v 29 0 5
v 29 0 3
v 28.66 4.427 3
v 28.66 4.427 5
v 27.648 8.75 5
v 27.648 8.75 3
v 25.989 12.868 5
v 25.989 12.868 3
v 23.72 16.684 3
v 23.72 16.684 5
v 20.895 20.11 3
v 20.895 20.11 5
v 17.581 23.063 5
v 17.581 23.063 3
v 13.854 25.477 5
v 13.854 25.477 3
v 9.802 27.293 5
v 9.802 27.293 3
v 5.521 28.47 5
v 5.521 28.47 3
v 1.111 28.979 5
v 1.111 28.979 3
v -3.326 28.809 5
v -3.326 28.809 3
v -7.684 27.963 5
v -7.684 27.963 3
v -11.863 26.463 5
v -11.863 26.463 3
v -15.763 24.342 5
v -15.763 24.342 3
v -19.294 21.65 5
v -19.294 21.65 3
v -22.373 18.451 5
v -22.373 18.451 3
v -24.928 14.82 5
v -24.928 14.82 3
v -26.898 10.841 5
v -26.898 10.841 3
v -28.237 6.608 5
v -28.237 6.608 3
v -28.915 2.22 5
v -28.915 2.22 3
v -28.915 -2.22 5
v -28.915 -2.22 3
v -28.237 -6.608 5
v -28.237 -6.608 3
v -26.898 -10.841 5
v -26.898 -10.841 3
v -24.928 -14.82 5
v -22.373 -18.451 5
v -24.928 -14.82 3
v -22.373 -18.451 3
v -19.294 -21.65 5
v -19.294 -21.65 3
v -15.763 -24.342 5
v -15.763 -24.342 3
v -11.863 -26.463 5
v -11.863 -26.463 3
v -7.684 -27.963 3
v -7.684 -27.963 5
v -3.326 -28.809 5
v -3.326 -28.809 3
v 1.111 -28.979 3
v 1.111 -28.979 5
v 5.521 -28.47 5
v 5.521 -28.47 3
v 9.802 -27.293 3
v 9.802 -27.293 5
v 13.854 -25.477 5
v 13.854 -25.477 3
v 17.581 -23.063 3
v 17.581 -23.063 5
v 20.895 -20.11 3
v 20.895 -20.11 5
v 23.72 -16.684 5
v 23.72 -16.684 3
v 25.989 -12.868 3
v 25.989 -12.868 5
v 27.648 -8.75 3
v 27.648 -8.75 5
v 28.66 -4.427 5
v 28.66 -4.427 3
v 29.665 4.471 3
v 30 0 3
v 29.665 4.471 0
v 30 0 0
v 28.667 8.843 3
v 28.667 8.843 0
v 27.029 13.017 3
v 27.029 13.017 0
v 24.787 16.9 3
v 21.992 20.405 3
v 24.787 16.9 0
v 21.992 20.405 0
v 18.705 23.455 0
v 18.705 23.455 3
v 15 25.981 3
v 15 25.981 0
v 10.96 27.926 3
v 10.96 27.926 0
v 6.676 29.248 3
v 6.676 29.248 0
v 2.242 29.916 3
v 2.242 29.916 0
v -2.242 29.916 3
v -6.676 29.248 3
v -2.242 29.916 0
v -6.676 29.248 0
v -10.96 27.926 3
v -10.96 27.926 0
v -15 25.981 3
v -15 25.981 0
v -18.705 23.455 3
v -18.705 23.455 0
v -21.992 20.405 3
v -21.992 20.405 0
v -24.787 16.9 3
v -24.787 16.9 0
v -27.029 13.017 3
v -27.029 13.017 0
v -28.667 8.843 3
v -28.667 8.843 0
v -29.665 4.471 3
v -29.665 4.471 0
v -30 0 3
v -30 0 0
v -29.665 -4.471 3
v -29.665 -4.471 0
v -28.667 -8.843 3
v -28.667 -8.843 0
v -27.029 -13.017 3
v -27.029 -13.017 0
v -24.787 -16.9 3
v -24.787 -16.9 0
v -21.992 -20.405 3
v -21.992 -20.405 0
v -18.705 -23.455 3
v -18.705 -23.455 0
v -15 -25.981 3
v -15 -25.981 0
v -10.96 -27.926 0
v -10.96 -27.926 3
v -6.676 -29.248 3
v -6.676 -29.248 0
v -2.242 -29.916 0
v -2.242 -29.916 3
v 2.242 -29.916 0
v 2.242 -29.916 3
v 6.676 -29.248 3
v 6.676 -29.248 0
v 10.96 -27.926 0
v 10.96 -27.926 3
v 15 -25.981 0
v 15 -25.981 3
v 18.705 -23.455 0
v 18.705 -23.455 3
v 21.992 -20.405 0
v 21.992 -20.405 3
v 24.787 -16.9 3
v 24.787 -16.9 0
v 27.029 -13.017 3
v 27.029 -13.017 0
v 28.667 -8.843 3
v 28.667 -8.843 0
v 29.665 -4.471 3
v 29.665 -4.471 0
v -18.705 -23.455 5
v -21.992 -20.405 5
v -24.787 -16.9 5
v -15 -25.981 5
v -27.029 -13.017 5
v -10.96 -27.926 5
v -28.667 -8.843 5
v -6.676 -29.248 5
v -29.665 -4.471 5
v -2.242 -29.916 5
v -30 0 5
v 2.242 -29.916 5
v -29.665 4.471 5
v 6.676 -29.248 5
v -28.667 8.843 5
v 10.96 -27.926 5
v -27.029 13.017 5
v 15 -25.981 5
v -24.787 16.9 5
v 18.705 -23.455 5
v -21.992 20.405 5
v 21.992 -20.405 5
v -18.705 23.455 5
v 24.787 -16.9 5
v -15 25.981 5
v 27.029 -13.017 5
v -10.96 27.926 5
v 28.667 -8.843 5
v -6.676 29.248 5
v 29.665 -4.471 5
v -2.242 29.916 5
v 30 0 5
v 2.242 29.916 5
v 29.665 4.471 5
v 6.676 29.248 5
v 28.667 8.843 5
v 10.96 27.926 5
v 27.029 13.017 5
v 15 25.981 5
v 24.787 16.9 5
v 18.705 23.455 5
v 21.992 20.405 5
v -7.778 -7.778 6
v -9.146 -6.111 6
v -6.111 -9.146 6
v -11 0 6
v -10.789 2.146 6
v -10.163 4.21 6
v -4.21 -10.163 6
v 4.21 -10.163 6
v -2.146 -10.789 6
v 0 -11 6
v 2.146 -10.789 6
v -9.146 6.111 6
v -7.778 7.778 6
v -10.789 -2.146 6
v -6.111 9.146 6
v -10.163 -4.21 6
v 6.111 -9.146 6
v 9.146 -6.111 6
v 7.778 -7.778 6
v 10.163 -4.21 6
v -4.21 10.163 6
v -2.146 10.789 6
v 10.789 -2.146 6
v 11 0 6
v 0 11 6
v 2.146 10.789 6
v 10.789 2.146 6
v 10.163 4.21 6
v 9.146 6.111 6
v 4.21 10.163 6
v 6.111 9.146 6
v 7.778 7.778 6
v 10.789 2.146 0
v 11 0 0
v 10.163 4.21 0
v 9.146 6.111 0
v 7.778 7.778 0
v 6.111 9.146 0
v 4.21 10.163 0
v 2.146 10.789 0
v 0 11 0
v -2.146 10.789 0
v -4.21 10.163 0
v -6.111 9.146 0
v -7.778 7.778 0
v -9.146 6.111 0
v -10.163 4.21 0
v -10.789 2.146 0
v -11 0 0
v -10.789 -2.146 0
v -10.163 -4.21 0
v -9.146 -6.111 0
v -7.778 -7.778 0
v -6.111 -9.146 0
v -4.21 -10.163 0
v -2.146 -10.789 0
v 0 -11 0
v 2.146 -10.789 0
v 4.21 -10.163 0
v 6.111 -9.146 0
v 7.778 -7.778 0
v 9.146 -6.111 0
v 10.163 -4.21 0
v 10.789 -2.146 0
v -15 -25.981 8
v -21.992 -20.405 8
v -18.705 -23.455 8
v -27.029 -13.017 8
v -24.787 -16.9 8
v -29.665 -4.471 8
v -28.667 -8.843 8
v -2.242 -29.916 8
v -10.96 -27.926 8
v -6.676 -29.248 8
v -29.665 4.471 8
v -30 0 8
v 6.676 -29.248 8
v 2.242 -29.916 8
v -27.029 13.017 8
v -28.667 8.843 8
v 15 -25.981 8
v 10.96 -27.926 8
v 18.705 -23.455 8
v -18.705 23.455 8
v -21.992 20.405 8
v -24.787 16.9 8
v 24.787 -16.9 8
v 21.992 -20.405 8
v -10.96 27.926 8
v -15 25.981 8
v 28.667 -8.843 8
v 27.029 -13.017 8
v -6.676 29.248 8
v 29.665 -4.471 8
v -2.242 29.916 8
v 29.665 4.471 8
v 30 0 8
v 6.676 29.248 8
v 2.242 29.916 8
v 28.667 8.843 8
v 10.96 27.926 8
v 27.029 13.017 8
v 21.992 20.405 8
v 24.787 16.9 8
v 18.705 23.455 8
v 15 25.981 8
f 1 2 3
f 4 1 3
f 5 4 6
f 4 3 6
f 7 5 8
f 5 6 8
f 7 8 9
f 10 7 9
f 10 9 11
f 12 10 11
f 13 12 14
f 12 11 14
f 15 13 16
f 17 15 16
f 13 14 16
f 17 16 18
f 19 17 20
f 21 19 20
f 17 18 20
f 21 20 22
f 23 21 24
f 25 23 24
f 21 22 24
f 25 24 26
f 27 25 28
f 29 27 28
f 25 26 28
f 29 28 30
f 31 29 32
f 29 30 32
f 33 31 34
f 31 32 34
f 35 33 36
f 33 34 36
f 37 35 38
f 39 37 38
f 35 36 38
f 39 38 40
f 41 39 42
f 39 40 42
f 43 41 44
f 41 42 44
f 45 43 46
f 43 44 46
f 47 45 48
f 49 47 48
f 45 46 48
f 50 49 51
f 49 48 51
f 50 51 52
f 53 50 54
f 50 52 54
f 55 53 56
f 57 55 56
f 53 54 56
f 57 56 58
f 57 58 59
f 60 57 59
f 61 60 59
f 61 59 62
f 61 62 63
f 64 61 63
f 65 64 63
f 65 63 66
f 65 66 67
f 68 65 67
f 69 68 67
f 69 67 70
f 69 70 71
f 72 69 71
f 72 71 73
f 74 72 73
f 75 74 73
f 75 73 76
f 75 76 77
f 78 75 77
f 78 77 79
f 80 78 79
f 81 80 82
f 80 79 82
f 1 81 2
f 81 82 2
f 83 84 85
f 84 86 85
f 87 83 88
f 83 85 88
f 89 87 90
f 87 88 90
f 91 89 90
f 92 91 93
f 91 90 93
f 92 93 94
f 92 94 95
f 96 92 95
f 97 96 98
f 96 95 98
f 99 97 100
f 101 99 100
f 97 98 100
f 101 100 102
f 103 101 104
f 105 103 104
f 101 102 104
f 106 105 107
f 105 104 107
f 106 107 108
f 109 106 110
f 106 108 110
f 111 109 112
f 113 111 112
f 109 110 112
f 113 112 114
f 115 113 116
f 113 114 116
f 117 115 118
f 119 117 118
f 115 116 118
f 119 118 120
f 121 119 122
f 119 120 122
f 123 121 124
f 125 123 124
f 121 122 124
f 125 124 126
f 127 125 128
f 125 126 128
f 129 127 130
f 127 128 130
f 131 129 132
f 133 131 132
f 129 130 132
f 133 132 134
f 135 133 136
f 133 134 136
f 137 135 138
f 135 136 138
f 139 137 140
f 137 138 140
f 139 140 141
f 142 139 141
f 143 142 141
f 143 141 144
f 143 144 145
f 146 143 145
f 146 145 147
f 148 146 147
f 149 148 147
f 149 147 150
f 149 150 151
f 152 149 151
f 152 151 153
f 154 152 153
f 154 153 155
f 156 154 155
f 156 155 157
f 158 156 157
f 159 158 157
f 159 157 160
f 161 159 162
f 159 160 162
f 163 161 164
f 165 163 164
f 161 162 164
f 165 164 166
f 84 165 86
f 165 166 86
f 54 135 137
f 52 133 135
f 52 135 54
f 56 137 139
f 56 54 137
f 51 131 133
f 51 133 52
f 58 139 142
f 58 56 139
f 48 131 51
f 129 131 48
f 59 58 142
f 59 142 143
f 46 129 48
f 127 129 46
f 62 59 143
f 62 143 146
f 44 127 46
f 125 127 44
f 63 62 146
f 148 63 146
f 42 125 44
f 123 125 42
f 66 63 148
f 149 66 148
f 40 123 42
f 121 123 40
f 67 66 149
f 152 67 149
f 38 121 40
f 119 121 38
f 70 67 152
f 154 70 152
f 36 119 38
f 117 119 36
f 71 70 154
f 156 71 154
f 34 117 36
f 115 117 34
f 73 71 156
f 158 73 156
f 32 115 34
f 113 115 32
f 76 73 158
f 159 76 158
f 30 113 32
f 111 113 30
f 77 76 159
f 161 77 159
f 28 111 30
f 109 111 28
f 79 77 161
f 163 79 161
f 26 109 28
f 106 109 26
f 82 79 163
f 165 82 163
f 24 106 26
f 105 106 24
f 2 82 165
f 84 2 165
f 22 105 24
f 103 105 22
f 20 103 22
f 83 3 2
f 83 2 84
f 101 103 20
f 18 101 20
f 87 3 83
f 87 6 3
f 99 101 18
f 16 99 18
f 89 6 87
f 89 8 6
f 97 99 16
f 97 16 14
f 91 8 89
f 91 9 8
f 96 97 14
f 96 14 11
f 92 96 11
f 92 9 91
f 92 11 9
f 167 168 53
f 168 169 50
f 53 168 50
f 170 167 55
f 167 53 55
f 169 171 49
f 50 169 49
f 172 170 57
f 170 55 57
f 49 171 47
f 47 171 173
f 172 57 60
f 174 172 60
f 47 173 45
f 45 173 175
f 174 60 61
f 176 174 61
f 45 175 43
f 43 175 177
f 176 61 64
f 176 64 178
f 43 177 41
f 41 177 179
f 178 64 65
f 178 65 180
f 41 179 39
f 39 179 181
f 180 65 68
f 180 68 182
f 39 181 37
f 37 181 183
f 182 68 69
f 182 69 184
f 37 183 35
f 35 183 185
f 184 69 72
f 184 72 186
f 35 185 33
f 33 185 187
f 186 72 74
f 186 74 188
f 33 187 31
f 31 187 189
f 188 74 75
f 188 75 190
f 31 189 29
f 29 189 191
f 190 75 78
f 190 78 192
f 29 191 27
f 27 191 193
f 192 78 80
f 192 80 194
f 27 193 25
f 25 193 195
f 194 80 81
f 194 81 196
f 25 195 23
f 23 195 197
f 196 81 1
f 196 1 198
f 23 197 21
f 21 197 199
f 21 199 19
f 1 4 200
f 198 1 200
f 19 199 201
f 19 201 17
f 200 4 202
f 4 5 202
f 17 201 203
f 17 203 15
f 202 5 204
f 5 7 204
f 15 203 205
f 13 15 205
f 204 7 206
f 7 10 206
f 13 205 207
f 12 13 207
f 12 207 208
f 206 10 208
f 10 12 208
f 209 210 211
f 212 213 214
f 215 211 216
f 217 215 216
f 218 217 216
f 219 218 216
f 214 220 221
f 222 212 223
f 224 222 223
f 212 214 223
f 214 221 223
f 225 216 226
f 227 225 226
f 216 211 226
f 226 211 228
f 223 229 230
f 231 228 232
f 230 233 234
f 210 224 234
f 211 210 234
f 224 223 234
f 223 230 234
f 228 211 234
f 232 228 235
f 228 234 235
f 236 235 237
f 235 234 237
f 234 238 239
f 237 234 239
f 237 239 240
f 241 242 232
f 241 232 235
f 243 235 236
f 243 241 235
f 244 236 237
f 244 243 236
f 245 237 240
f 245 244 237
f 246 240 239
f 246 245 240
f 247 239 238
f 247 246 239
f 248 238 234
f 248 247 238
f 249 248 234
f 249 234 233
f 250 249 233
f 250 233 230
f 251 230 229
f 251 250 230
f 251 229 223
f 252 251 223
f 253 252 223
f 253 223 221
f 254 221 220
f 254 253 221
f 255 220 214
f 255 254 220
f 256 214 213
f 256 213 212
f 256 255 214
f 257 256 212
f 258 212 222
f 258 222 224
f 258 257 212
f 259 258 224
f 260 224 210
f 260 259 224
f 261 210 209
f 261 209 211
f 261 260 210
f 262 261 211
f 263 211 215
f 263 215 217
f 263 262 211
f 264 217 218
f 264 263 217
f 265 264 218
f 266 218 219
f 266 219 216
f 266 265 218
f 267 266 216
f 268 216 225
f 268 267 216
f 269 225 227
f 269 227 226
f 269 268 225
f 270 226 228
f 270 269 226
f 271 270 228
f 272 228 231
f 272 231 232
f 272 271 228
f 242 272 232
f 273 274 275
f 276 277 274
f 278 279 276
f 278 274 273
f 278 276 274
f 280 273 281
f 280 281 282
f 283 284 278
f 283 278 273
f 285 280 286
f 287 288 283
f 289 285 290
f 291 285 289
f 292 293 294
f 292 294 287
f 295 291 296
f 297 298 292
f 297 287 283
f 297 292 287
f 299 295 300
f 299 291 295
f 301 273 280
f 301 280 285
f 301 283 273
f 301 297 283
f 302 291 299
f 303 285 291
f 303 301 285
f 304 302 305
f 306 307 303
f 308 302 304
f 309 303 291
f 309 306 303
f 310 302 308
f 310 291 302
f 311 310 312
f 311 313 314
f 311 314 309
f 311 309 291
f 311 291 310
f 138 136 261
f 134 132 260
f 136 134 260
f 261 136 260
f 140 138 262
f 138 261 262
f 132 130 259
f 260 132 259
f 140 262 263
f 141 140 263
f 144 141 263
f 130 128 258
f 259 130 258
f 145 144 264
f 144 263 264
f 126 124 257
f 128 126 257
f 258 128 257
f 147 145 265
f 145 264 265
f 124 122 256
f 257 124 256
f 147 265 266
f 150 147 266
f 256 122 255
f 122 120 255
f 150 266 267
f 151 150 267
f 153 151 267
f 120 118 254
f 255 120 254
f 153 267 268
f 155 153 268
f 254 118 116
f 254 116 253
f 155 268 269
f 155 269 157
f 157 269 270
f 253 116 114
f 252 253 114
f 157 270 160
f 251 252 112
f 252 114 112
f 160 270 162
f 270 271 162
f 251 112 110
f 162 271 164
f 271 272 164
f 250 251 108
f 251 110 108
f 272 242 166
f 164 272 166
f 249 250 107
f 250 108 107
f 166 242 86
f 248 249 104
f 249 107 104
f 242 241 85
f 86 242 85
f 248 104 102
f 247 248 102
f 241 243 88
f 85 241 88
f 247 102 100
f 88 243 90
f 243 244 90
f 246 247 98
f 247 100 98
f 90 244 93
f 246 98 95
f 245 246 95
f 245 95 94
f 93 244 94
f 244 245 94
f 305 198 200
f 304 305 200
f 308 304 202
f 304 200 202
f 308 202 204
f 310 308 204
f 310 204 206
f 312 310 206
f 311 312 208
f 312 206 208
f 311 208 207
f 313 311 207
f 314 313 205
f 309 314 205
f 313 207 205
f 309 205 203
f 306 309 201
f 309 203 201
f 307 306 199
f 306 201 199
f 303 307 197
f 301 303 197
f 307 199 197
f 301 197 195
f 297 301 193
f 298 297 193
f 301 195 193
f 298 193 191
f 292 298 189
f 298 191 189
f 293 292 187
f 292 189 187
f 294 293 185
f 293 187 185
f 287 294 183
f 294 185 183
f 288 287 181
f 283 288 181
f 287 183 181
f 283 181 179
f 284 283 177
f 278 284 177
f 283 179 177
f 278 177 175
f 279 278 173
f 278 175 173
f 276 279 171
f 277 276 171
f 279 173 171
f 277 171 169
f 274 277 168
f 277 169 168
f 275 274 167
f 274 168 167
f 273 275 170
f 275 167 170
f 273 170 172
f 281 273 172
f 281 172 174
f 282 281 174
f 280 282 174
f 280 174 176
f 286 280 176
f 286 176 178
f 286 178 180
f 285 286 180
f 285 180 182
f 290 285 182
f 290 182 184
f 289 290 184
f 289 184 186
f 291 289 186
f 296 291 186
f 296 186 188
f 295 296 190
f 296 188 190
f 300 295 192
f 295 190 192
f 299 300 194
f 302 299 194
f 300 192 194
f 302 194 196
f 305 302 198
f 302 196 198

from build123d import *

# Parameters (mm, degrees)
ESQUISSE1_R                  = 30
ESQUISSE1_R_2                = 11
BOSS_EXTRU_1_DEPTH           = 6
ESQUISSE2_R                  = 30
BOSS_EXTRU_2_DEPTH           = 2
ENL_V_MAT_EXTRU_1_DEPTH      = 1
ENL_V_MAT_EXTRU_1_DEPTH_BACK = 1
ESQUISSE3_R                  = 30
ESQUISSE3_R_2                = 29


with BuildPart() as part:
    # Esquisse1 → Boss.-Extru.1 (new body)
    with BuildSketch(Plane.XY):
        Circle(ESQUISSE1_R)
        Circle(ESQUISSE1_R_2, mode=Mode.SUBTRACT)
    extrude(amount=BOSS_EXTRU_1_DEPTH)

    # Esquisse2 → Boss.-Extru.2 (add)
    with BuildSketch(Plane.XY.offset(6)):
        Circle(ESQUISSE2_R)
    extrude(amount=BOSS_EXTRU_2_DEPTH)

    # Esquisse3 → Enlèv. mat.-Extru.1 (cut, two sides: drawn at the far end of the back side and taken through both)
    with BuildSketch(Plane.XY.offset(4).offset(-ENL_V_MAT_EXTRU_1_DEPTH_BACK)):
        Circle(ESQUISSE3_R)
        Circle(ESQUISSE3_R_2, mode=Mode.SUBTRACT)
    extrude(amount=ENL_V_MAT_EXTRU_1_DEPTH + ENL_V_MAT_EXTRU_1_DEPTH_BACK, mode=Mode.SUBTRACT)


solid = part.part
